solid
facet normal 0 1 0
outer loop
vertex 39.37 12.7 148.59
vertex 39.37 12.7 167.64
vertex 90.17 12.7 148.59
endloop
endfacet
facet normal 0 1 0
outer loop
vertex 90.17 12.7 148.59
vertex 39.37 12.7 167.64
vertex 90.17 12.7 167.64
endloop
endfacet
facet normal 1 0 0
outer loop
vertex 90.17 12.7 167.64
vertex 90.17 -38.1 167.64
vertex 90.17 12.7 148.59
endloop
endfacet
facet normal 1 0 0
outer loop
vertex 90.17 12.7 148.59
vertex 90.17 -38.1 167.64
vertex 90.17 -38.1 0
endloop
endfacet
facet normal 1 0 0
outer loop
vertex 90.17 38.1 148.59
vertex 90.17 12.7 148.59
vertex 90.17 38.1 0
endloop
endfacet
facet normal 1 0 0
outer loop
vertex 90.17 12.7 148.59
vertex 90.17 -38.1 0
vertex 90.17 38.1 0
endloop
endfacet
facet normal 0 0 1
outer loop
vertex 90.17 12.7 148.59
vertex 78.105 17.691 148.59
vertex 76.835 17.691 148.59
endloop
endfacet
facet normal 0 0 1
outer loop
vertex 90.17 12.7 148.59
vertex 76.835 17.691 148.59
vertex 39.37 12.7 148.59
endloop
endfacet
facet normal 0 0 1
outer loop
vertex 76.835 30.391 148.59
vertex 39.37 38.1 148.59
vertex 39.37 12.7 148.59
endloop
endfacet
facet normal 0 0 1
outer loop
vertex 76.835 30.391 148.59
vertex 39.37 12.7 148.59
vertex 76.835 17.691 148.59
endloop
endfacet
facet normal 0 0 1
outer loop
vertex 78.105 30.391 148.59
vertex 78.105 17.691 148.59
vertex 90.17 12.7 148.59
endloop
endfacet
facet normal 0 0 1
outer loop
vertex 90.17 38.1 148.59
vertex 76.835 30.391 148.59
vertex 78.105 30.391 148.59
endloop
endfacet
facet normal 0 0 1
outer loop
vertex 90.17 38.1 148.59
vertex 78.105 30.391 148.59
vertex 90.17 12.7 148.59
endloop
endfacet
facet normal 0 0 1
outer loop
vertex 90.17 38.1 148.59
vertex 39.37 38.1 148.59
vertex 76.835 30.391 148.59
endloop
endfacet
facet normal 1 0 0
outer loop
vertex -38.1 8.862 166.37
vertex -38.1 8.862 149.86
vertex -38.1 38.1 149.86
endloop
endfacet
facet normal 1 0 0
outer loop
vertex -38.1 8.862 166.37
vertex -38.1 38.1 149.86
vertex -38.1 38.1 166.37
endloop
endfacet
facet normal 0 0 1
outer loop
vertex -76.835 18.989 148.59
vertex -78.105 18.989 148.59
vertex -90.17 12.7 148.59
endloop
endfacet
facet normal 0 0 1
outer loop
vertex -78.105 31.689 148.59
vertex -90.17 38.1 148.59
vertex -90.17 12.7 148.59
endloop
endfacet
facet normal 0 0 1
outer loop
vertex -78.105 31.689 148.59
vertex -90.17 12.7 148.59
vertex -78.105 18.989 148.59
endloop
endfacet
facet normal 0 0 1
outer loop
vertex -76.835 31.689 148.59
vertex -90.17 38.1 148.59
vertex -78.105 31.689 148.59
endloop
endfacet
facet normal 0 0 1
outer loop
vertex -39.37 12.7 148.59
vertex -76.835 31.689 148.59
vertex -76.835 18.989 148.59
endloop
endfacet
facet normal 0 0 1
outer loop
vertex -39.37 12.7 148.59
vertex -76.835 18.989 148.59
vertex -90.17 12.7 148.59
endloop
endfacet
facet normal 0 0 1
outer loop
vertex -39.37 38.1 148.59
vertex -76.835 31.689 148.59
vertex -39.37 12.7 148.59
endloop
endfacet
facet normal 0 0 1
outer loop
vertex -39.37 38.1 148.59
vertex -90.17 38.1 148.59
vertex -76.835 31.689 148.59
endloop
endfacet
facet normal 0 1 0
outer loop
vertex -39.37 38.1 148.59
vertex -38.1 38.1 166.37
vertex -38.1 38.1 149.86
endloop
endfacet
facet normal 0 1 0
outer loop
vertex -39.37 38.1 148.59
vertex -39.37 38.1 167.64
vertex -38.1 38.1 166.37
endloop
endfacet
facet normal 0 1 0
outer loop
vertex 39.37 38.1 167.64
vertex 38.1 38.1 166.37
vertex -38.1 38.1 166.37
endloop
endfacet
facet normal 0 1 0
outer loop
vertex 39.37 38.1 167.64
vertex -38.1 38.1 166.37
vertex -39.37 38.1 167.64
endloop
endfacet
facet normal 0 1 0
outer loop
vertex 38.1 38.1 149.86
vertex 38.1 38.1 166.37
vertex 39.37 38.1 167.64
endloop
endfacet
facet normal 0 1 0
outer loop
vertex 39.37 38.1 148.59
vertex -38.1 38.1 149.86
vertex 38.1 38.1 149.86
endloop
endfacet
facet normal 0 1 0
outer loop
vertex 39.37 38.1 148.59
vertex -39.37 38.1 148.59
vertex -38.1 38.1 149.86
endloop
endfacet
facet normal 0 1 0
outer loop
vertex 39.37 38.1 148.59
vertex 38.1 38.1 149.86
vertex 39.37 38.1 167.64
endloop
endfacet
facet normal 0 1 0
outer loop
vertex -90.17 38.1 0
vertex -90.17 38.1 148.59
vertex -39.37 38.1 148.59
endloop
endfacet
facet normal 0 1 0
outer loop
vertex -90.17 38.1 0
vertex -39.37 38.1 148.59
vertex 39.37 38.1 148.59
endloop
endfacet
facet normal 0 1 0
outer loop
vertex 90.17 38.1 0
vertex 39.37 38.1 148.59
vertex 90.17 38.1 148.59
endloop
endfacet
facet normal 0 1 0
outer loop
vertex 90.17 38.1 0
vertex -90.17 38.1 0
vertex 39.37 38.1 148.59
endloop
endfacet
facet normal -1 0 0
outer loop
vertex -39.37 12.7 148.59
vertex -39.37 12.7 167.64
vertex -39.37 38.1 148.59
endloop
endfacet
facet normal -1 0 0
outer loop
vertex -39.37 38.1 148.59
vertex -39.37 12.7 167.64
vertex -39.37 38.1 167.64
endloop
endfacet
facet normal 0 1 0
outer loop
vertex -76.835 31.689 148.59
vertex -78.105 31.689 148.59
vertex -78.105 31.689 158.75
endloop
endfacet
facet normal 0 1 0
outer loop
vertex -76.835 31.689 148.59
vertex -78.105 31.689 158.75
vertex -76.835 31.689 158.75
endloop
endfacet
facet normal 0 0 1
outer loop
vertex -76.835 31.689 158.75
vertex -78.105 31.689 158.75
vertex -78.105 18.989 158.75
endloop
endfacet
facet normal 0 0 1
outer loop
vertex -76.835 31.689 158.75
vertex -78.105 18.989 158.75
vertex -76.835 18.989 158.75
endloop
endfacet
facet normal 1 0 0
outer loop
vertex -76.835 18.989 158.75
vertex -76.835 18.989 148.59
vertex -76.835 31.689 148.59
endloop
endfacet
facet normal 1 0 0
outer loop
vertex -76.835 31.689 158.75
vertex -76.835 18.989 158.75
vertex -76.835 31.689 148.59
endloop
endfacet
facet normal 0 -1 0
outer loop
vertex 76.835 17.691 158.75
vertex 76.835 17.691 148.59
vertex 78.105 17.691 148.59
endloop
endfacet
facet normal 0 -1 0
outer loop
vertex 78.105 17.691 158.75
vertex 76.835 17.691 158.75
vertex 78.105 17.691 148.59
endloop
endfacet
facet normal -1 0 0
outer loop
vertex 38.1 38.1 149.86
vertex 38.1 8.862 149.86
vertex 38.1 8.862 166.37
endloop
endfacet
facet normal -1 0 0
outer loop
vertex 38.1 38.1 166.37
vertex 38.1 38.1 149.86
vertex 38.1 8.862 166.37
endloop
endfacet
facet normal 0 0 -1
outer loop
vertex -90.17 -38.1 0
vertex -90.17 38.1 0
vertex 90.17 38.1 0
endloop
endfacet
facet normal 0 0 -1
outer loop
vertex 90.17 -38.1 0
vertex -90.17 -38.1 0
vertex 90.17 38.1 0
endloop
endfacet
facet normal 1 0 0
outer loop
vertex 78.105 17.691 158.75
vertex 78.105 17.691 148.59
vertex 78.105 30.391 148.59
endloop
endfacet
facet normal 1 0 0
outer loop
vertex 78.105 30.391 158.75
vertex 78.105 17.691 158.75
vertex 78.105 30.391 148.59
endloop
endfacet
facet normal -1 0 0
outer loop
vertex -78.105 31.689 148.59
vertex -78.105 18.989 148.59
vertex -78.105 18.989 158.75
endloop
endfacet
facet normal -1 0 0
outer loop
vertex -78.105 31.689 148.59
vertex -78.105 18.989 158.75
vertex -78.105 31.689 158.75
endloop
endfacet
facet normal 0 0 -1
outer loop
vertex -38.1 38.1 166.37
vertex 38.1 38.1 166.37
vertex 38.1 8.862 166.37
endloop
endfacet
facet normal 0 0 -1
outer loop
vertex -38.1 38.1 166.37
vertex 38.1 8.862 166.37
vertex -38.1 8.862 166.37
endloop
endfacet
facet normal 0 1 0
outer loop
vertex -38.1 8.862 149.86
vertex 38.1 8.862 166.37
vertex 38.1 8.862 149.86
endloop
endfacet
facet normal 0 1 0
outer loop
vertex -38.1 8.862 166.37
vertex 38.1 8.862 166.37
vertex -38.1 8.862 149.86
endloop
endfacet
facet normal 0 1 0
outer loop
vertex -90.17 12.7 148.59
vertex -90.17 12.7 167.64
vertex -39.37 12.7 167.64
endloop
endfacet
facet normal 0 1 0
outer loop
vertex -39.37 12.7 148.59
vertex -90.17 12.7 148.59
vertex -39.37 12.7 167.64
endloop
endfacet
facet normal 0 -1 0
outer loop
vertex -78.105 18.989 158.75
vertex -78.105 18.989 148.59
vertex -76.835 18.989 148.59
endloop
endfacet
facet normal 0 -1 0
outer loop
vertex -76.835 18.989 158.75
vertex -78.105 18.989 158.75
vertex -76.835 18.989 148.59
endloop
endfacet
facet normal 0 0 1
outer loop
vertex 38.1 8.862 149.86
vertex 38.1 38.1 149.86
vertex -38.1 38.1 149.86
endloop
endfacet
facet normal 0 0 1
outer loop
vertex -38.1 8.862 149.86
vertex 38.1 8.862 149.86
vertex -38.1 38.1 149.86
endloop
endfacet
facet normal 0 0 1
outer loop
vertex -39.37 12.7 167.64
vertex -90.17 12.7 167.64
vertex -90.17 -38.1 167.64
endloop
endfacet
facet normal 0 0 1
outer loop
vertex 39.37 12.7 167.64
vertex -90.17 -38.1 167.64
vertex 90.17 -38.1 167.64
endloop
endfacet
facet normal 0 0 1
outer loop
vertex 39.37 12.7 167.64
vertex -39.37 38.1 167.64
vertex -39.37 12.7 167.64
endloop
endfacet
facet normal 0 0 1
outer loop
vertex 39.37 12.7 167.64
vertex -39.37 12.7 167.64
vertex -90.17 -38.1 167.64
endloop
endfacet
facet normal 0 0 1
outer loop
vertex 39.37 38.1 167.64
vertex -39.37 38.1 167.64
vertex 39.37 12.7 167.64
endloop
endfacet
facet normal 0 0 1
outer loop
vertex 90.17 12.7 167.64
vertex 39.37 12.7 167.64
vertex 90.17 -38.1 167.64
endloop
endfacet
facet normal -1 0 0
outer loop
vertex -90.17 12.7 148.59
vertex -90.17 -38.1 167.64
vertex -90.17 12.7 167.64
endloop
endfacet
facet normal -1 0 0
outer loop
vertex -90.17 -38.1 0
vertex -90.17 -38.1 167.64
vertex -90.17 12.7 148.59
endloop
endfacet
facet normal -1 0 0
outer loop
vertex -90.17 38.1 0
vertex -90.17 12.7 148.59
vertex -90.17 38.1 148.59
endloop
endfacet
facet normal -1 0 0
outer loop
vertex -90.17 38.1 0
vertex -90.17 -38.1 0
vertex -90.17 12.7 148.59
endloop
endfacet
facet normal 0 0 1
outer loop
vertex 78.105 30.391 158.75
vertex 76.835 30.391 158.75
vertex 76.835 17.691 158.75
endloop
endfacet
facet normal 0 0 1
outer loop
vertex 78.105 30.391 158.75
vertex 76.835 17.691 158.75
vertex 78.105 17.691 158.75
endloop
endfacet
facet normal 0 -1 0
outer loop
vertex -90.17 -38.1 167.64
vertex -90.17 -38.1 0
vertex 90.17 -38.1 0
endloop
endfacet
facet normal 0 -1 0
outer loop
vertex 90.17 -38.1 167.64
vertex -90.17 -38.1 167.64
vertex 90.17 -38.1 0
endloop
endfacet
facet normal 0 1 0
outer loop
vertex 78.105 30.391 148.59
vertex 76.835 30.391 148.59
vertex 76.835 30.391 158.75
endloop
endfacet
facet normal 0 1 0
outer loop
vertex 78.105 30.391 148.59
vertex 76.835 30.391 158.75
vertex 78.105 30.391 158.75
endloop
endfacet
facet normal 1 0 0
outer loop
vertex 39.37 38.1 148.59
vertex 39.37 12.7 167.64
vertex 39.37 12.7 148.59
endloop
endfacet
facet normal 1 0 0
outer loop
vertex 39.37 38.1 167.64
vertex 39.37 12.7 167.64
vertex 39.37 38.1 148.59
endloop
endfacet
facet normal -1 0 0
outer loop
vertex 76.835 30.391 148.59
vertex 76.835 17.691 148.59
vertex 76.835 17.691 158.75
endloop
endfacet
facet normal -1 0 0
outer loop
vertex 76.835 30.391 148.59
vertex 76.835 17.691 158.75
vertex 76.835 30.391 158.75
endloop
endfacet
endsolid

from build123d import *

# Parameters (mm, degrees)
F0_W     = 180.34
F0_H     = 76.2
F1_DEPTH = 167.64
F2_W     = 50.8
F2_H     = 25.4
F3_DEPTH = 19.05
F4_W     = 1.27
F4_H     = 12.7
F5_DEPTH = 10.16
F7_W     = 76.2
F7_H     = 16.51
F8_DEPTH = 29.23794


with BuildPart() as f1:
    # F0 (on Top) → F1 (new body)
    with BuildSketch(Plane.XY):
        Rectangle(F0_W, F0_H)
    extrude(amount=F1_DEPTH)

    # F2 (on face) → F3 (cut)
    with BuildSketch(Plane.XY.offset(167.64)):
        with Locations((64.77, 25.4)):
            Rectangle(F2_W, F2_H)
        with Locations((-64.77, 25.4)):
            Rectangle(F2_W, F2_H)
    extrude(amount=-F3_DEPTH, mode=Mode.SUBTRACT)

    # F4 (on face) → F5 (join)
    with BuildSketch(Plane.XY.offset(148.59)):
        with Locations((77.47, 24.041014)):
            Rectangle(F4_W, F4_H)
        with Locations((-77.47, 25.339247)):
            Rectangle(F4_W, F4_H)
    extrude(amount=F5_DEPTH)

    # F7 (on face) → F8 (cut)
    with BuildSketch(Plane(origin=(0, 38.1, 0), x_dir=(-1, 0, 0), z_dir=(0, 1, 0))):
        with Locations((0, 158.115)):
            Rectangle(F7_W, F7_H)
    extrude(amount=-F8_DEPTH, mode=Mode.SUBTRACT)


solid = f1.part
